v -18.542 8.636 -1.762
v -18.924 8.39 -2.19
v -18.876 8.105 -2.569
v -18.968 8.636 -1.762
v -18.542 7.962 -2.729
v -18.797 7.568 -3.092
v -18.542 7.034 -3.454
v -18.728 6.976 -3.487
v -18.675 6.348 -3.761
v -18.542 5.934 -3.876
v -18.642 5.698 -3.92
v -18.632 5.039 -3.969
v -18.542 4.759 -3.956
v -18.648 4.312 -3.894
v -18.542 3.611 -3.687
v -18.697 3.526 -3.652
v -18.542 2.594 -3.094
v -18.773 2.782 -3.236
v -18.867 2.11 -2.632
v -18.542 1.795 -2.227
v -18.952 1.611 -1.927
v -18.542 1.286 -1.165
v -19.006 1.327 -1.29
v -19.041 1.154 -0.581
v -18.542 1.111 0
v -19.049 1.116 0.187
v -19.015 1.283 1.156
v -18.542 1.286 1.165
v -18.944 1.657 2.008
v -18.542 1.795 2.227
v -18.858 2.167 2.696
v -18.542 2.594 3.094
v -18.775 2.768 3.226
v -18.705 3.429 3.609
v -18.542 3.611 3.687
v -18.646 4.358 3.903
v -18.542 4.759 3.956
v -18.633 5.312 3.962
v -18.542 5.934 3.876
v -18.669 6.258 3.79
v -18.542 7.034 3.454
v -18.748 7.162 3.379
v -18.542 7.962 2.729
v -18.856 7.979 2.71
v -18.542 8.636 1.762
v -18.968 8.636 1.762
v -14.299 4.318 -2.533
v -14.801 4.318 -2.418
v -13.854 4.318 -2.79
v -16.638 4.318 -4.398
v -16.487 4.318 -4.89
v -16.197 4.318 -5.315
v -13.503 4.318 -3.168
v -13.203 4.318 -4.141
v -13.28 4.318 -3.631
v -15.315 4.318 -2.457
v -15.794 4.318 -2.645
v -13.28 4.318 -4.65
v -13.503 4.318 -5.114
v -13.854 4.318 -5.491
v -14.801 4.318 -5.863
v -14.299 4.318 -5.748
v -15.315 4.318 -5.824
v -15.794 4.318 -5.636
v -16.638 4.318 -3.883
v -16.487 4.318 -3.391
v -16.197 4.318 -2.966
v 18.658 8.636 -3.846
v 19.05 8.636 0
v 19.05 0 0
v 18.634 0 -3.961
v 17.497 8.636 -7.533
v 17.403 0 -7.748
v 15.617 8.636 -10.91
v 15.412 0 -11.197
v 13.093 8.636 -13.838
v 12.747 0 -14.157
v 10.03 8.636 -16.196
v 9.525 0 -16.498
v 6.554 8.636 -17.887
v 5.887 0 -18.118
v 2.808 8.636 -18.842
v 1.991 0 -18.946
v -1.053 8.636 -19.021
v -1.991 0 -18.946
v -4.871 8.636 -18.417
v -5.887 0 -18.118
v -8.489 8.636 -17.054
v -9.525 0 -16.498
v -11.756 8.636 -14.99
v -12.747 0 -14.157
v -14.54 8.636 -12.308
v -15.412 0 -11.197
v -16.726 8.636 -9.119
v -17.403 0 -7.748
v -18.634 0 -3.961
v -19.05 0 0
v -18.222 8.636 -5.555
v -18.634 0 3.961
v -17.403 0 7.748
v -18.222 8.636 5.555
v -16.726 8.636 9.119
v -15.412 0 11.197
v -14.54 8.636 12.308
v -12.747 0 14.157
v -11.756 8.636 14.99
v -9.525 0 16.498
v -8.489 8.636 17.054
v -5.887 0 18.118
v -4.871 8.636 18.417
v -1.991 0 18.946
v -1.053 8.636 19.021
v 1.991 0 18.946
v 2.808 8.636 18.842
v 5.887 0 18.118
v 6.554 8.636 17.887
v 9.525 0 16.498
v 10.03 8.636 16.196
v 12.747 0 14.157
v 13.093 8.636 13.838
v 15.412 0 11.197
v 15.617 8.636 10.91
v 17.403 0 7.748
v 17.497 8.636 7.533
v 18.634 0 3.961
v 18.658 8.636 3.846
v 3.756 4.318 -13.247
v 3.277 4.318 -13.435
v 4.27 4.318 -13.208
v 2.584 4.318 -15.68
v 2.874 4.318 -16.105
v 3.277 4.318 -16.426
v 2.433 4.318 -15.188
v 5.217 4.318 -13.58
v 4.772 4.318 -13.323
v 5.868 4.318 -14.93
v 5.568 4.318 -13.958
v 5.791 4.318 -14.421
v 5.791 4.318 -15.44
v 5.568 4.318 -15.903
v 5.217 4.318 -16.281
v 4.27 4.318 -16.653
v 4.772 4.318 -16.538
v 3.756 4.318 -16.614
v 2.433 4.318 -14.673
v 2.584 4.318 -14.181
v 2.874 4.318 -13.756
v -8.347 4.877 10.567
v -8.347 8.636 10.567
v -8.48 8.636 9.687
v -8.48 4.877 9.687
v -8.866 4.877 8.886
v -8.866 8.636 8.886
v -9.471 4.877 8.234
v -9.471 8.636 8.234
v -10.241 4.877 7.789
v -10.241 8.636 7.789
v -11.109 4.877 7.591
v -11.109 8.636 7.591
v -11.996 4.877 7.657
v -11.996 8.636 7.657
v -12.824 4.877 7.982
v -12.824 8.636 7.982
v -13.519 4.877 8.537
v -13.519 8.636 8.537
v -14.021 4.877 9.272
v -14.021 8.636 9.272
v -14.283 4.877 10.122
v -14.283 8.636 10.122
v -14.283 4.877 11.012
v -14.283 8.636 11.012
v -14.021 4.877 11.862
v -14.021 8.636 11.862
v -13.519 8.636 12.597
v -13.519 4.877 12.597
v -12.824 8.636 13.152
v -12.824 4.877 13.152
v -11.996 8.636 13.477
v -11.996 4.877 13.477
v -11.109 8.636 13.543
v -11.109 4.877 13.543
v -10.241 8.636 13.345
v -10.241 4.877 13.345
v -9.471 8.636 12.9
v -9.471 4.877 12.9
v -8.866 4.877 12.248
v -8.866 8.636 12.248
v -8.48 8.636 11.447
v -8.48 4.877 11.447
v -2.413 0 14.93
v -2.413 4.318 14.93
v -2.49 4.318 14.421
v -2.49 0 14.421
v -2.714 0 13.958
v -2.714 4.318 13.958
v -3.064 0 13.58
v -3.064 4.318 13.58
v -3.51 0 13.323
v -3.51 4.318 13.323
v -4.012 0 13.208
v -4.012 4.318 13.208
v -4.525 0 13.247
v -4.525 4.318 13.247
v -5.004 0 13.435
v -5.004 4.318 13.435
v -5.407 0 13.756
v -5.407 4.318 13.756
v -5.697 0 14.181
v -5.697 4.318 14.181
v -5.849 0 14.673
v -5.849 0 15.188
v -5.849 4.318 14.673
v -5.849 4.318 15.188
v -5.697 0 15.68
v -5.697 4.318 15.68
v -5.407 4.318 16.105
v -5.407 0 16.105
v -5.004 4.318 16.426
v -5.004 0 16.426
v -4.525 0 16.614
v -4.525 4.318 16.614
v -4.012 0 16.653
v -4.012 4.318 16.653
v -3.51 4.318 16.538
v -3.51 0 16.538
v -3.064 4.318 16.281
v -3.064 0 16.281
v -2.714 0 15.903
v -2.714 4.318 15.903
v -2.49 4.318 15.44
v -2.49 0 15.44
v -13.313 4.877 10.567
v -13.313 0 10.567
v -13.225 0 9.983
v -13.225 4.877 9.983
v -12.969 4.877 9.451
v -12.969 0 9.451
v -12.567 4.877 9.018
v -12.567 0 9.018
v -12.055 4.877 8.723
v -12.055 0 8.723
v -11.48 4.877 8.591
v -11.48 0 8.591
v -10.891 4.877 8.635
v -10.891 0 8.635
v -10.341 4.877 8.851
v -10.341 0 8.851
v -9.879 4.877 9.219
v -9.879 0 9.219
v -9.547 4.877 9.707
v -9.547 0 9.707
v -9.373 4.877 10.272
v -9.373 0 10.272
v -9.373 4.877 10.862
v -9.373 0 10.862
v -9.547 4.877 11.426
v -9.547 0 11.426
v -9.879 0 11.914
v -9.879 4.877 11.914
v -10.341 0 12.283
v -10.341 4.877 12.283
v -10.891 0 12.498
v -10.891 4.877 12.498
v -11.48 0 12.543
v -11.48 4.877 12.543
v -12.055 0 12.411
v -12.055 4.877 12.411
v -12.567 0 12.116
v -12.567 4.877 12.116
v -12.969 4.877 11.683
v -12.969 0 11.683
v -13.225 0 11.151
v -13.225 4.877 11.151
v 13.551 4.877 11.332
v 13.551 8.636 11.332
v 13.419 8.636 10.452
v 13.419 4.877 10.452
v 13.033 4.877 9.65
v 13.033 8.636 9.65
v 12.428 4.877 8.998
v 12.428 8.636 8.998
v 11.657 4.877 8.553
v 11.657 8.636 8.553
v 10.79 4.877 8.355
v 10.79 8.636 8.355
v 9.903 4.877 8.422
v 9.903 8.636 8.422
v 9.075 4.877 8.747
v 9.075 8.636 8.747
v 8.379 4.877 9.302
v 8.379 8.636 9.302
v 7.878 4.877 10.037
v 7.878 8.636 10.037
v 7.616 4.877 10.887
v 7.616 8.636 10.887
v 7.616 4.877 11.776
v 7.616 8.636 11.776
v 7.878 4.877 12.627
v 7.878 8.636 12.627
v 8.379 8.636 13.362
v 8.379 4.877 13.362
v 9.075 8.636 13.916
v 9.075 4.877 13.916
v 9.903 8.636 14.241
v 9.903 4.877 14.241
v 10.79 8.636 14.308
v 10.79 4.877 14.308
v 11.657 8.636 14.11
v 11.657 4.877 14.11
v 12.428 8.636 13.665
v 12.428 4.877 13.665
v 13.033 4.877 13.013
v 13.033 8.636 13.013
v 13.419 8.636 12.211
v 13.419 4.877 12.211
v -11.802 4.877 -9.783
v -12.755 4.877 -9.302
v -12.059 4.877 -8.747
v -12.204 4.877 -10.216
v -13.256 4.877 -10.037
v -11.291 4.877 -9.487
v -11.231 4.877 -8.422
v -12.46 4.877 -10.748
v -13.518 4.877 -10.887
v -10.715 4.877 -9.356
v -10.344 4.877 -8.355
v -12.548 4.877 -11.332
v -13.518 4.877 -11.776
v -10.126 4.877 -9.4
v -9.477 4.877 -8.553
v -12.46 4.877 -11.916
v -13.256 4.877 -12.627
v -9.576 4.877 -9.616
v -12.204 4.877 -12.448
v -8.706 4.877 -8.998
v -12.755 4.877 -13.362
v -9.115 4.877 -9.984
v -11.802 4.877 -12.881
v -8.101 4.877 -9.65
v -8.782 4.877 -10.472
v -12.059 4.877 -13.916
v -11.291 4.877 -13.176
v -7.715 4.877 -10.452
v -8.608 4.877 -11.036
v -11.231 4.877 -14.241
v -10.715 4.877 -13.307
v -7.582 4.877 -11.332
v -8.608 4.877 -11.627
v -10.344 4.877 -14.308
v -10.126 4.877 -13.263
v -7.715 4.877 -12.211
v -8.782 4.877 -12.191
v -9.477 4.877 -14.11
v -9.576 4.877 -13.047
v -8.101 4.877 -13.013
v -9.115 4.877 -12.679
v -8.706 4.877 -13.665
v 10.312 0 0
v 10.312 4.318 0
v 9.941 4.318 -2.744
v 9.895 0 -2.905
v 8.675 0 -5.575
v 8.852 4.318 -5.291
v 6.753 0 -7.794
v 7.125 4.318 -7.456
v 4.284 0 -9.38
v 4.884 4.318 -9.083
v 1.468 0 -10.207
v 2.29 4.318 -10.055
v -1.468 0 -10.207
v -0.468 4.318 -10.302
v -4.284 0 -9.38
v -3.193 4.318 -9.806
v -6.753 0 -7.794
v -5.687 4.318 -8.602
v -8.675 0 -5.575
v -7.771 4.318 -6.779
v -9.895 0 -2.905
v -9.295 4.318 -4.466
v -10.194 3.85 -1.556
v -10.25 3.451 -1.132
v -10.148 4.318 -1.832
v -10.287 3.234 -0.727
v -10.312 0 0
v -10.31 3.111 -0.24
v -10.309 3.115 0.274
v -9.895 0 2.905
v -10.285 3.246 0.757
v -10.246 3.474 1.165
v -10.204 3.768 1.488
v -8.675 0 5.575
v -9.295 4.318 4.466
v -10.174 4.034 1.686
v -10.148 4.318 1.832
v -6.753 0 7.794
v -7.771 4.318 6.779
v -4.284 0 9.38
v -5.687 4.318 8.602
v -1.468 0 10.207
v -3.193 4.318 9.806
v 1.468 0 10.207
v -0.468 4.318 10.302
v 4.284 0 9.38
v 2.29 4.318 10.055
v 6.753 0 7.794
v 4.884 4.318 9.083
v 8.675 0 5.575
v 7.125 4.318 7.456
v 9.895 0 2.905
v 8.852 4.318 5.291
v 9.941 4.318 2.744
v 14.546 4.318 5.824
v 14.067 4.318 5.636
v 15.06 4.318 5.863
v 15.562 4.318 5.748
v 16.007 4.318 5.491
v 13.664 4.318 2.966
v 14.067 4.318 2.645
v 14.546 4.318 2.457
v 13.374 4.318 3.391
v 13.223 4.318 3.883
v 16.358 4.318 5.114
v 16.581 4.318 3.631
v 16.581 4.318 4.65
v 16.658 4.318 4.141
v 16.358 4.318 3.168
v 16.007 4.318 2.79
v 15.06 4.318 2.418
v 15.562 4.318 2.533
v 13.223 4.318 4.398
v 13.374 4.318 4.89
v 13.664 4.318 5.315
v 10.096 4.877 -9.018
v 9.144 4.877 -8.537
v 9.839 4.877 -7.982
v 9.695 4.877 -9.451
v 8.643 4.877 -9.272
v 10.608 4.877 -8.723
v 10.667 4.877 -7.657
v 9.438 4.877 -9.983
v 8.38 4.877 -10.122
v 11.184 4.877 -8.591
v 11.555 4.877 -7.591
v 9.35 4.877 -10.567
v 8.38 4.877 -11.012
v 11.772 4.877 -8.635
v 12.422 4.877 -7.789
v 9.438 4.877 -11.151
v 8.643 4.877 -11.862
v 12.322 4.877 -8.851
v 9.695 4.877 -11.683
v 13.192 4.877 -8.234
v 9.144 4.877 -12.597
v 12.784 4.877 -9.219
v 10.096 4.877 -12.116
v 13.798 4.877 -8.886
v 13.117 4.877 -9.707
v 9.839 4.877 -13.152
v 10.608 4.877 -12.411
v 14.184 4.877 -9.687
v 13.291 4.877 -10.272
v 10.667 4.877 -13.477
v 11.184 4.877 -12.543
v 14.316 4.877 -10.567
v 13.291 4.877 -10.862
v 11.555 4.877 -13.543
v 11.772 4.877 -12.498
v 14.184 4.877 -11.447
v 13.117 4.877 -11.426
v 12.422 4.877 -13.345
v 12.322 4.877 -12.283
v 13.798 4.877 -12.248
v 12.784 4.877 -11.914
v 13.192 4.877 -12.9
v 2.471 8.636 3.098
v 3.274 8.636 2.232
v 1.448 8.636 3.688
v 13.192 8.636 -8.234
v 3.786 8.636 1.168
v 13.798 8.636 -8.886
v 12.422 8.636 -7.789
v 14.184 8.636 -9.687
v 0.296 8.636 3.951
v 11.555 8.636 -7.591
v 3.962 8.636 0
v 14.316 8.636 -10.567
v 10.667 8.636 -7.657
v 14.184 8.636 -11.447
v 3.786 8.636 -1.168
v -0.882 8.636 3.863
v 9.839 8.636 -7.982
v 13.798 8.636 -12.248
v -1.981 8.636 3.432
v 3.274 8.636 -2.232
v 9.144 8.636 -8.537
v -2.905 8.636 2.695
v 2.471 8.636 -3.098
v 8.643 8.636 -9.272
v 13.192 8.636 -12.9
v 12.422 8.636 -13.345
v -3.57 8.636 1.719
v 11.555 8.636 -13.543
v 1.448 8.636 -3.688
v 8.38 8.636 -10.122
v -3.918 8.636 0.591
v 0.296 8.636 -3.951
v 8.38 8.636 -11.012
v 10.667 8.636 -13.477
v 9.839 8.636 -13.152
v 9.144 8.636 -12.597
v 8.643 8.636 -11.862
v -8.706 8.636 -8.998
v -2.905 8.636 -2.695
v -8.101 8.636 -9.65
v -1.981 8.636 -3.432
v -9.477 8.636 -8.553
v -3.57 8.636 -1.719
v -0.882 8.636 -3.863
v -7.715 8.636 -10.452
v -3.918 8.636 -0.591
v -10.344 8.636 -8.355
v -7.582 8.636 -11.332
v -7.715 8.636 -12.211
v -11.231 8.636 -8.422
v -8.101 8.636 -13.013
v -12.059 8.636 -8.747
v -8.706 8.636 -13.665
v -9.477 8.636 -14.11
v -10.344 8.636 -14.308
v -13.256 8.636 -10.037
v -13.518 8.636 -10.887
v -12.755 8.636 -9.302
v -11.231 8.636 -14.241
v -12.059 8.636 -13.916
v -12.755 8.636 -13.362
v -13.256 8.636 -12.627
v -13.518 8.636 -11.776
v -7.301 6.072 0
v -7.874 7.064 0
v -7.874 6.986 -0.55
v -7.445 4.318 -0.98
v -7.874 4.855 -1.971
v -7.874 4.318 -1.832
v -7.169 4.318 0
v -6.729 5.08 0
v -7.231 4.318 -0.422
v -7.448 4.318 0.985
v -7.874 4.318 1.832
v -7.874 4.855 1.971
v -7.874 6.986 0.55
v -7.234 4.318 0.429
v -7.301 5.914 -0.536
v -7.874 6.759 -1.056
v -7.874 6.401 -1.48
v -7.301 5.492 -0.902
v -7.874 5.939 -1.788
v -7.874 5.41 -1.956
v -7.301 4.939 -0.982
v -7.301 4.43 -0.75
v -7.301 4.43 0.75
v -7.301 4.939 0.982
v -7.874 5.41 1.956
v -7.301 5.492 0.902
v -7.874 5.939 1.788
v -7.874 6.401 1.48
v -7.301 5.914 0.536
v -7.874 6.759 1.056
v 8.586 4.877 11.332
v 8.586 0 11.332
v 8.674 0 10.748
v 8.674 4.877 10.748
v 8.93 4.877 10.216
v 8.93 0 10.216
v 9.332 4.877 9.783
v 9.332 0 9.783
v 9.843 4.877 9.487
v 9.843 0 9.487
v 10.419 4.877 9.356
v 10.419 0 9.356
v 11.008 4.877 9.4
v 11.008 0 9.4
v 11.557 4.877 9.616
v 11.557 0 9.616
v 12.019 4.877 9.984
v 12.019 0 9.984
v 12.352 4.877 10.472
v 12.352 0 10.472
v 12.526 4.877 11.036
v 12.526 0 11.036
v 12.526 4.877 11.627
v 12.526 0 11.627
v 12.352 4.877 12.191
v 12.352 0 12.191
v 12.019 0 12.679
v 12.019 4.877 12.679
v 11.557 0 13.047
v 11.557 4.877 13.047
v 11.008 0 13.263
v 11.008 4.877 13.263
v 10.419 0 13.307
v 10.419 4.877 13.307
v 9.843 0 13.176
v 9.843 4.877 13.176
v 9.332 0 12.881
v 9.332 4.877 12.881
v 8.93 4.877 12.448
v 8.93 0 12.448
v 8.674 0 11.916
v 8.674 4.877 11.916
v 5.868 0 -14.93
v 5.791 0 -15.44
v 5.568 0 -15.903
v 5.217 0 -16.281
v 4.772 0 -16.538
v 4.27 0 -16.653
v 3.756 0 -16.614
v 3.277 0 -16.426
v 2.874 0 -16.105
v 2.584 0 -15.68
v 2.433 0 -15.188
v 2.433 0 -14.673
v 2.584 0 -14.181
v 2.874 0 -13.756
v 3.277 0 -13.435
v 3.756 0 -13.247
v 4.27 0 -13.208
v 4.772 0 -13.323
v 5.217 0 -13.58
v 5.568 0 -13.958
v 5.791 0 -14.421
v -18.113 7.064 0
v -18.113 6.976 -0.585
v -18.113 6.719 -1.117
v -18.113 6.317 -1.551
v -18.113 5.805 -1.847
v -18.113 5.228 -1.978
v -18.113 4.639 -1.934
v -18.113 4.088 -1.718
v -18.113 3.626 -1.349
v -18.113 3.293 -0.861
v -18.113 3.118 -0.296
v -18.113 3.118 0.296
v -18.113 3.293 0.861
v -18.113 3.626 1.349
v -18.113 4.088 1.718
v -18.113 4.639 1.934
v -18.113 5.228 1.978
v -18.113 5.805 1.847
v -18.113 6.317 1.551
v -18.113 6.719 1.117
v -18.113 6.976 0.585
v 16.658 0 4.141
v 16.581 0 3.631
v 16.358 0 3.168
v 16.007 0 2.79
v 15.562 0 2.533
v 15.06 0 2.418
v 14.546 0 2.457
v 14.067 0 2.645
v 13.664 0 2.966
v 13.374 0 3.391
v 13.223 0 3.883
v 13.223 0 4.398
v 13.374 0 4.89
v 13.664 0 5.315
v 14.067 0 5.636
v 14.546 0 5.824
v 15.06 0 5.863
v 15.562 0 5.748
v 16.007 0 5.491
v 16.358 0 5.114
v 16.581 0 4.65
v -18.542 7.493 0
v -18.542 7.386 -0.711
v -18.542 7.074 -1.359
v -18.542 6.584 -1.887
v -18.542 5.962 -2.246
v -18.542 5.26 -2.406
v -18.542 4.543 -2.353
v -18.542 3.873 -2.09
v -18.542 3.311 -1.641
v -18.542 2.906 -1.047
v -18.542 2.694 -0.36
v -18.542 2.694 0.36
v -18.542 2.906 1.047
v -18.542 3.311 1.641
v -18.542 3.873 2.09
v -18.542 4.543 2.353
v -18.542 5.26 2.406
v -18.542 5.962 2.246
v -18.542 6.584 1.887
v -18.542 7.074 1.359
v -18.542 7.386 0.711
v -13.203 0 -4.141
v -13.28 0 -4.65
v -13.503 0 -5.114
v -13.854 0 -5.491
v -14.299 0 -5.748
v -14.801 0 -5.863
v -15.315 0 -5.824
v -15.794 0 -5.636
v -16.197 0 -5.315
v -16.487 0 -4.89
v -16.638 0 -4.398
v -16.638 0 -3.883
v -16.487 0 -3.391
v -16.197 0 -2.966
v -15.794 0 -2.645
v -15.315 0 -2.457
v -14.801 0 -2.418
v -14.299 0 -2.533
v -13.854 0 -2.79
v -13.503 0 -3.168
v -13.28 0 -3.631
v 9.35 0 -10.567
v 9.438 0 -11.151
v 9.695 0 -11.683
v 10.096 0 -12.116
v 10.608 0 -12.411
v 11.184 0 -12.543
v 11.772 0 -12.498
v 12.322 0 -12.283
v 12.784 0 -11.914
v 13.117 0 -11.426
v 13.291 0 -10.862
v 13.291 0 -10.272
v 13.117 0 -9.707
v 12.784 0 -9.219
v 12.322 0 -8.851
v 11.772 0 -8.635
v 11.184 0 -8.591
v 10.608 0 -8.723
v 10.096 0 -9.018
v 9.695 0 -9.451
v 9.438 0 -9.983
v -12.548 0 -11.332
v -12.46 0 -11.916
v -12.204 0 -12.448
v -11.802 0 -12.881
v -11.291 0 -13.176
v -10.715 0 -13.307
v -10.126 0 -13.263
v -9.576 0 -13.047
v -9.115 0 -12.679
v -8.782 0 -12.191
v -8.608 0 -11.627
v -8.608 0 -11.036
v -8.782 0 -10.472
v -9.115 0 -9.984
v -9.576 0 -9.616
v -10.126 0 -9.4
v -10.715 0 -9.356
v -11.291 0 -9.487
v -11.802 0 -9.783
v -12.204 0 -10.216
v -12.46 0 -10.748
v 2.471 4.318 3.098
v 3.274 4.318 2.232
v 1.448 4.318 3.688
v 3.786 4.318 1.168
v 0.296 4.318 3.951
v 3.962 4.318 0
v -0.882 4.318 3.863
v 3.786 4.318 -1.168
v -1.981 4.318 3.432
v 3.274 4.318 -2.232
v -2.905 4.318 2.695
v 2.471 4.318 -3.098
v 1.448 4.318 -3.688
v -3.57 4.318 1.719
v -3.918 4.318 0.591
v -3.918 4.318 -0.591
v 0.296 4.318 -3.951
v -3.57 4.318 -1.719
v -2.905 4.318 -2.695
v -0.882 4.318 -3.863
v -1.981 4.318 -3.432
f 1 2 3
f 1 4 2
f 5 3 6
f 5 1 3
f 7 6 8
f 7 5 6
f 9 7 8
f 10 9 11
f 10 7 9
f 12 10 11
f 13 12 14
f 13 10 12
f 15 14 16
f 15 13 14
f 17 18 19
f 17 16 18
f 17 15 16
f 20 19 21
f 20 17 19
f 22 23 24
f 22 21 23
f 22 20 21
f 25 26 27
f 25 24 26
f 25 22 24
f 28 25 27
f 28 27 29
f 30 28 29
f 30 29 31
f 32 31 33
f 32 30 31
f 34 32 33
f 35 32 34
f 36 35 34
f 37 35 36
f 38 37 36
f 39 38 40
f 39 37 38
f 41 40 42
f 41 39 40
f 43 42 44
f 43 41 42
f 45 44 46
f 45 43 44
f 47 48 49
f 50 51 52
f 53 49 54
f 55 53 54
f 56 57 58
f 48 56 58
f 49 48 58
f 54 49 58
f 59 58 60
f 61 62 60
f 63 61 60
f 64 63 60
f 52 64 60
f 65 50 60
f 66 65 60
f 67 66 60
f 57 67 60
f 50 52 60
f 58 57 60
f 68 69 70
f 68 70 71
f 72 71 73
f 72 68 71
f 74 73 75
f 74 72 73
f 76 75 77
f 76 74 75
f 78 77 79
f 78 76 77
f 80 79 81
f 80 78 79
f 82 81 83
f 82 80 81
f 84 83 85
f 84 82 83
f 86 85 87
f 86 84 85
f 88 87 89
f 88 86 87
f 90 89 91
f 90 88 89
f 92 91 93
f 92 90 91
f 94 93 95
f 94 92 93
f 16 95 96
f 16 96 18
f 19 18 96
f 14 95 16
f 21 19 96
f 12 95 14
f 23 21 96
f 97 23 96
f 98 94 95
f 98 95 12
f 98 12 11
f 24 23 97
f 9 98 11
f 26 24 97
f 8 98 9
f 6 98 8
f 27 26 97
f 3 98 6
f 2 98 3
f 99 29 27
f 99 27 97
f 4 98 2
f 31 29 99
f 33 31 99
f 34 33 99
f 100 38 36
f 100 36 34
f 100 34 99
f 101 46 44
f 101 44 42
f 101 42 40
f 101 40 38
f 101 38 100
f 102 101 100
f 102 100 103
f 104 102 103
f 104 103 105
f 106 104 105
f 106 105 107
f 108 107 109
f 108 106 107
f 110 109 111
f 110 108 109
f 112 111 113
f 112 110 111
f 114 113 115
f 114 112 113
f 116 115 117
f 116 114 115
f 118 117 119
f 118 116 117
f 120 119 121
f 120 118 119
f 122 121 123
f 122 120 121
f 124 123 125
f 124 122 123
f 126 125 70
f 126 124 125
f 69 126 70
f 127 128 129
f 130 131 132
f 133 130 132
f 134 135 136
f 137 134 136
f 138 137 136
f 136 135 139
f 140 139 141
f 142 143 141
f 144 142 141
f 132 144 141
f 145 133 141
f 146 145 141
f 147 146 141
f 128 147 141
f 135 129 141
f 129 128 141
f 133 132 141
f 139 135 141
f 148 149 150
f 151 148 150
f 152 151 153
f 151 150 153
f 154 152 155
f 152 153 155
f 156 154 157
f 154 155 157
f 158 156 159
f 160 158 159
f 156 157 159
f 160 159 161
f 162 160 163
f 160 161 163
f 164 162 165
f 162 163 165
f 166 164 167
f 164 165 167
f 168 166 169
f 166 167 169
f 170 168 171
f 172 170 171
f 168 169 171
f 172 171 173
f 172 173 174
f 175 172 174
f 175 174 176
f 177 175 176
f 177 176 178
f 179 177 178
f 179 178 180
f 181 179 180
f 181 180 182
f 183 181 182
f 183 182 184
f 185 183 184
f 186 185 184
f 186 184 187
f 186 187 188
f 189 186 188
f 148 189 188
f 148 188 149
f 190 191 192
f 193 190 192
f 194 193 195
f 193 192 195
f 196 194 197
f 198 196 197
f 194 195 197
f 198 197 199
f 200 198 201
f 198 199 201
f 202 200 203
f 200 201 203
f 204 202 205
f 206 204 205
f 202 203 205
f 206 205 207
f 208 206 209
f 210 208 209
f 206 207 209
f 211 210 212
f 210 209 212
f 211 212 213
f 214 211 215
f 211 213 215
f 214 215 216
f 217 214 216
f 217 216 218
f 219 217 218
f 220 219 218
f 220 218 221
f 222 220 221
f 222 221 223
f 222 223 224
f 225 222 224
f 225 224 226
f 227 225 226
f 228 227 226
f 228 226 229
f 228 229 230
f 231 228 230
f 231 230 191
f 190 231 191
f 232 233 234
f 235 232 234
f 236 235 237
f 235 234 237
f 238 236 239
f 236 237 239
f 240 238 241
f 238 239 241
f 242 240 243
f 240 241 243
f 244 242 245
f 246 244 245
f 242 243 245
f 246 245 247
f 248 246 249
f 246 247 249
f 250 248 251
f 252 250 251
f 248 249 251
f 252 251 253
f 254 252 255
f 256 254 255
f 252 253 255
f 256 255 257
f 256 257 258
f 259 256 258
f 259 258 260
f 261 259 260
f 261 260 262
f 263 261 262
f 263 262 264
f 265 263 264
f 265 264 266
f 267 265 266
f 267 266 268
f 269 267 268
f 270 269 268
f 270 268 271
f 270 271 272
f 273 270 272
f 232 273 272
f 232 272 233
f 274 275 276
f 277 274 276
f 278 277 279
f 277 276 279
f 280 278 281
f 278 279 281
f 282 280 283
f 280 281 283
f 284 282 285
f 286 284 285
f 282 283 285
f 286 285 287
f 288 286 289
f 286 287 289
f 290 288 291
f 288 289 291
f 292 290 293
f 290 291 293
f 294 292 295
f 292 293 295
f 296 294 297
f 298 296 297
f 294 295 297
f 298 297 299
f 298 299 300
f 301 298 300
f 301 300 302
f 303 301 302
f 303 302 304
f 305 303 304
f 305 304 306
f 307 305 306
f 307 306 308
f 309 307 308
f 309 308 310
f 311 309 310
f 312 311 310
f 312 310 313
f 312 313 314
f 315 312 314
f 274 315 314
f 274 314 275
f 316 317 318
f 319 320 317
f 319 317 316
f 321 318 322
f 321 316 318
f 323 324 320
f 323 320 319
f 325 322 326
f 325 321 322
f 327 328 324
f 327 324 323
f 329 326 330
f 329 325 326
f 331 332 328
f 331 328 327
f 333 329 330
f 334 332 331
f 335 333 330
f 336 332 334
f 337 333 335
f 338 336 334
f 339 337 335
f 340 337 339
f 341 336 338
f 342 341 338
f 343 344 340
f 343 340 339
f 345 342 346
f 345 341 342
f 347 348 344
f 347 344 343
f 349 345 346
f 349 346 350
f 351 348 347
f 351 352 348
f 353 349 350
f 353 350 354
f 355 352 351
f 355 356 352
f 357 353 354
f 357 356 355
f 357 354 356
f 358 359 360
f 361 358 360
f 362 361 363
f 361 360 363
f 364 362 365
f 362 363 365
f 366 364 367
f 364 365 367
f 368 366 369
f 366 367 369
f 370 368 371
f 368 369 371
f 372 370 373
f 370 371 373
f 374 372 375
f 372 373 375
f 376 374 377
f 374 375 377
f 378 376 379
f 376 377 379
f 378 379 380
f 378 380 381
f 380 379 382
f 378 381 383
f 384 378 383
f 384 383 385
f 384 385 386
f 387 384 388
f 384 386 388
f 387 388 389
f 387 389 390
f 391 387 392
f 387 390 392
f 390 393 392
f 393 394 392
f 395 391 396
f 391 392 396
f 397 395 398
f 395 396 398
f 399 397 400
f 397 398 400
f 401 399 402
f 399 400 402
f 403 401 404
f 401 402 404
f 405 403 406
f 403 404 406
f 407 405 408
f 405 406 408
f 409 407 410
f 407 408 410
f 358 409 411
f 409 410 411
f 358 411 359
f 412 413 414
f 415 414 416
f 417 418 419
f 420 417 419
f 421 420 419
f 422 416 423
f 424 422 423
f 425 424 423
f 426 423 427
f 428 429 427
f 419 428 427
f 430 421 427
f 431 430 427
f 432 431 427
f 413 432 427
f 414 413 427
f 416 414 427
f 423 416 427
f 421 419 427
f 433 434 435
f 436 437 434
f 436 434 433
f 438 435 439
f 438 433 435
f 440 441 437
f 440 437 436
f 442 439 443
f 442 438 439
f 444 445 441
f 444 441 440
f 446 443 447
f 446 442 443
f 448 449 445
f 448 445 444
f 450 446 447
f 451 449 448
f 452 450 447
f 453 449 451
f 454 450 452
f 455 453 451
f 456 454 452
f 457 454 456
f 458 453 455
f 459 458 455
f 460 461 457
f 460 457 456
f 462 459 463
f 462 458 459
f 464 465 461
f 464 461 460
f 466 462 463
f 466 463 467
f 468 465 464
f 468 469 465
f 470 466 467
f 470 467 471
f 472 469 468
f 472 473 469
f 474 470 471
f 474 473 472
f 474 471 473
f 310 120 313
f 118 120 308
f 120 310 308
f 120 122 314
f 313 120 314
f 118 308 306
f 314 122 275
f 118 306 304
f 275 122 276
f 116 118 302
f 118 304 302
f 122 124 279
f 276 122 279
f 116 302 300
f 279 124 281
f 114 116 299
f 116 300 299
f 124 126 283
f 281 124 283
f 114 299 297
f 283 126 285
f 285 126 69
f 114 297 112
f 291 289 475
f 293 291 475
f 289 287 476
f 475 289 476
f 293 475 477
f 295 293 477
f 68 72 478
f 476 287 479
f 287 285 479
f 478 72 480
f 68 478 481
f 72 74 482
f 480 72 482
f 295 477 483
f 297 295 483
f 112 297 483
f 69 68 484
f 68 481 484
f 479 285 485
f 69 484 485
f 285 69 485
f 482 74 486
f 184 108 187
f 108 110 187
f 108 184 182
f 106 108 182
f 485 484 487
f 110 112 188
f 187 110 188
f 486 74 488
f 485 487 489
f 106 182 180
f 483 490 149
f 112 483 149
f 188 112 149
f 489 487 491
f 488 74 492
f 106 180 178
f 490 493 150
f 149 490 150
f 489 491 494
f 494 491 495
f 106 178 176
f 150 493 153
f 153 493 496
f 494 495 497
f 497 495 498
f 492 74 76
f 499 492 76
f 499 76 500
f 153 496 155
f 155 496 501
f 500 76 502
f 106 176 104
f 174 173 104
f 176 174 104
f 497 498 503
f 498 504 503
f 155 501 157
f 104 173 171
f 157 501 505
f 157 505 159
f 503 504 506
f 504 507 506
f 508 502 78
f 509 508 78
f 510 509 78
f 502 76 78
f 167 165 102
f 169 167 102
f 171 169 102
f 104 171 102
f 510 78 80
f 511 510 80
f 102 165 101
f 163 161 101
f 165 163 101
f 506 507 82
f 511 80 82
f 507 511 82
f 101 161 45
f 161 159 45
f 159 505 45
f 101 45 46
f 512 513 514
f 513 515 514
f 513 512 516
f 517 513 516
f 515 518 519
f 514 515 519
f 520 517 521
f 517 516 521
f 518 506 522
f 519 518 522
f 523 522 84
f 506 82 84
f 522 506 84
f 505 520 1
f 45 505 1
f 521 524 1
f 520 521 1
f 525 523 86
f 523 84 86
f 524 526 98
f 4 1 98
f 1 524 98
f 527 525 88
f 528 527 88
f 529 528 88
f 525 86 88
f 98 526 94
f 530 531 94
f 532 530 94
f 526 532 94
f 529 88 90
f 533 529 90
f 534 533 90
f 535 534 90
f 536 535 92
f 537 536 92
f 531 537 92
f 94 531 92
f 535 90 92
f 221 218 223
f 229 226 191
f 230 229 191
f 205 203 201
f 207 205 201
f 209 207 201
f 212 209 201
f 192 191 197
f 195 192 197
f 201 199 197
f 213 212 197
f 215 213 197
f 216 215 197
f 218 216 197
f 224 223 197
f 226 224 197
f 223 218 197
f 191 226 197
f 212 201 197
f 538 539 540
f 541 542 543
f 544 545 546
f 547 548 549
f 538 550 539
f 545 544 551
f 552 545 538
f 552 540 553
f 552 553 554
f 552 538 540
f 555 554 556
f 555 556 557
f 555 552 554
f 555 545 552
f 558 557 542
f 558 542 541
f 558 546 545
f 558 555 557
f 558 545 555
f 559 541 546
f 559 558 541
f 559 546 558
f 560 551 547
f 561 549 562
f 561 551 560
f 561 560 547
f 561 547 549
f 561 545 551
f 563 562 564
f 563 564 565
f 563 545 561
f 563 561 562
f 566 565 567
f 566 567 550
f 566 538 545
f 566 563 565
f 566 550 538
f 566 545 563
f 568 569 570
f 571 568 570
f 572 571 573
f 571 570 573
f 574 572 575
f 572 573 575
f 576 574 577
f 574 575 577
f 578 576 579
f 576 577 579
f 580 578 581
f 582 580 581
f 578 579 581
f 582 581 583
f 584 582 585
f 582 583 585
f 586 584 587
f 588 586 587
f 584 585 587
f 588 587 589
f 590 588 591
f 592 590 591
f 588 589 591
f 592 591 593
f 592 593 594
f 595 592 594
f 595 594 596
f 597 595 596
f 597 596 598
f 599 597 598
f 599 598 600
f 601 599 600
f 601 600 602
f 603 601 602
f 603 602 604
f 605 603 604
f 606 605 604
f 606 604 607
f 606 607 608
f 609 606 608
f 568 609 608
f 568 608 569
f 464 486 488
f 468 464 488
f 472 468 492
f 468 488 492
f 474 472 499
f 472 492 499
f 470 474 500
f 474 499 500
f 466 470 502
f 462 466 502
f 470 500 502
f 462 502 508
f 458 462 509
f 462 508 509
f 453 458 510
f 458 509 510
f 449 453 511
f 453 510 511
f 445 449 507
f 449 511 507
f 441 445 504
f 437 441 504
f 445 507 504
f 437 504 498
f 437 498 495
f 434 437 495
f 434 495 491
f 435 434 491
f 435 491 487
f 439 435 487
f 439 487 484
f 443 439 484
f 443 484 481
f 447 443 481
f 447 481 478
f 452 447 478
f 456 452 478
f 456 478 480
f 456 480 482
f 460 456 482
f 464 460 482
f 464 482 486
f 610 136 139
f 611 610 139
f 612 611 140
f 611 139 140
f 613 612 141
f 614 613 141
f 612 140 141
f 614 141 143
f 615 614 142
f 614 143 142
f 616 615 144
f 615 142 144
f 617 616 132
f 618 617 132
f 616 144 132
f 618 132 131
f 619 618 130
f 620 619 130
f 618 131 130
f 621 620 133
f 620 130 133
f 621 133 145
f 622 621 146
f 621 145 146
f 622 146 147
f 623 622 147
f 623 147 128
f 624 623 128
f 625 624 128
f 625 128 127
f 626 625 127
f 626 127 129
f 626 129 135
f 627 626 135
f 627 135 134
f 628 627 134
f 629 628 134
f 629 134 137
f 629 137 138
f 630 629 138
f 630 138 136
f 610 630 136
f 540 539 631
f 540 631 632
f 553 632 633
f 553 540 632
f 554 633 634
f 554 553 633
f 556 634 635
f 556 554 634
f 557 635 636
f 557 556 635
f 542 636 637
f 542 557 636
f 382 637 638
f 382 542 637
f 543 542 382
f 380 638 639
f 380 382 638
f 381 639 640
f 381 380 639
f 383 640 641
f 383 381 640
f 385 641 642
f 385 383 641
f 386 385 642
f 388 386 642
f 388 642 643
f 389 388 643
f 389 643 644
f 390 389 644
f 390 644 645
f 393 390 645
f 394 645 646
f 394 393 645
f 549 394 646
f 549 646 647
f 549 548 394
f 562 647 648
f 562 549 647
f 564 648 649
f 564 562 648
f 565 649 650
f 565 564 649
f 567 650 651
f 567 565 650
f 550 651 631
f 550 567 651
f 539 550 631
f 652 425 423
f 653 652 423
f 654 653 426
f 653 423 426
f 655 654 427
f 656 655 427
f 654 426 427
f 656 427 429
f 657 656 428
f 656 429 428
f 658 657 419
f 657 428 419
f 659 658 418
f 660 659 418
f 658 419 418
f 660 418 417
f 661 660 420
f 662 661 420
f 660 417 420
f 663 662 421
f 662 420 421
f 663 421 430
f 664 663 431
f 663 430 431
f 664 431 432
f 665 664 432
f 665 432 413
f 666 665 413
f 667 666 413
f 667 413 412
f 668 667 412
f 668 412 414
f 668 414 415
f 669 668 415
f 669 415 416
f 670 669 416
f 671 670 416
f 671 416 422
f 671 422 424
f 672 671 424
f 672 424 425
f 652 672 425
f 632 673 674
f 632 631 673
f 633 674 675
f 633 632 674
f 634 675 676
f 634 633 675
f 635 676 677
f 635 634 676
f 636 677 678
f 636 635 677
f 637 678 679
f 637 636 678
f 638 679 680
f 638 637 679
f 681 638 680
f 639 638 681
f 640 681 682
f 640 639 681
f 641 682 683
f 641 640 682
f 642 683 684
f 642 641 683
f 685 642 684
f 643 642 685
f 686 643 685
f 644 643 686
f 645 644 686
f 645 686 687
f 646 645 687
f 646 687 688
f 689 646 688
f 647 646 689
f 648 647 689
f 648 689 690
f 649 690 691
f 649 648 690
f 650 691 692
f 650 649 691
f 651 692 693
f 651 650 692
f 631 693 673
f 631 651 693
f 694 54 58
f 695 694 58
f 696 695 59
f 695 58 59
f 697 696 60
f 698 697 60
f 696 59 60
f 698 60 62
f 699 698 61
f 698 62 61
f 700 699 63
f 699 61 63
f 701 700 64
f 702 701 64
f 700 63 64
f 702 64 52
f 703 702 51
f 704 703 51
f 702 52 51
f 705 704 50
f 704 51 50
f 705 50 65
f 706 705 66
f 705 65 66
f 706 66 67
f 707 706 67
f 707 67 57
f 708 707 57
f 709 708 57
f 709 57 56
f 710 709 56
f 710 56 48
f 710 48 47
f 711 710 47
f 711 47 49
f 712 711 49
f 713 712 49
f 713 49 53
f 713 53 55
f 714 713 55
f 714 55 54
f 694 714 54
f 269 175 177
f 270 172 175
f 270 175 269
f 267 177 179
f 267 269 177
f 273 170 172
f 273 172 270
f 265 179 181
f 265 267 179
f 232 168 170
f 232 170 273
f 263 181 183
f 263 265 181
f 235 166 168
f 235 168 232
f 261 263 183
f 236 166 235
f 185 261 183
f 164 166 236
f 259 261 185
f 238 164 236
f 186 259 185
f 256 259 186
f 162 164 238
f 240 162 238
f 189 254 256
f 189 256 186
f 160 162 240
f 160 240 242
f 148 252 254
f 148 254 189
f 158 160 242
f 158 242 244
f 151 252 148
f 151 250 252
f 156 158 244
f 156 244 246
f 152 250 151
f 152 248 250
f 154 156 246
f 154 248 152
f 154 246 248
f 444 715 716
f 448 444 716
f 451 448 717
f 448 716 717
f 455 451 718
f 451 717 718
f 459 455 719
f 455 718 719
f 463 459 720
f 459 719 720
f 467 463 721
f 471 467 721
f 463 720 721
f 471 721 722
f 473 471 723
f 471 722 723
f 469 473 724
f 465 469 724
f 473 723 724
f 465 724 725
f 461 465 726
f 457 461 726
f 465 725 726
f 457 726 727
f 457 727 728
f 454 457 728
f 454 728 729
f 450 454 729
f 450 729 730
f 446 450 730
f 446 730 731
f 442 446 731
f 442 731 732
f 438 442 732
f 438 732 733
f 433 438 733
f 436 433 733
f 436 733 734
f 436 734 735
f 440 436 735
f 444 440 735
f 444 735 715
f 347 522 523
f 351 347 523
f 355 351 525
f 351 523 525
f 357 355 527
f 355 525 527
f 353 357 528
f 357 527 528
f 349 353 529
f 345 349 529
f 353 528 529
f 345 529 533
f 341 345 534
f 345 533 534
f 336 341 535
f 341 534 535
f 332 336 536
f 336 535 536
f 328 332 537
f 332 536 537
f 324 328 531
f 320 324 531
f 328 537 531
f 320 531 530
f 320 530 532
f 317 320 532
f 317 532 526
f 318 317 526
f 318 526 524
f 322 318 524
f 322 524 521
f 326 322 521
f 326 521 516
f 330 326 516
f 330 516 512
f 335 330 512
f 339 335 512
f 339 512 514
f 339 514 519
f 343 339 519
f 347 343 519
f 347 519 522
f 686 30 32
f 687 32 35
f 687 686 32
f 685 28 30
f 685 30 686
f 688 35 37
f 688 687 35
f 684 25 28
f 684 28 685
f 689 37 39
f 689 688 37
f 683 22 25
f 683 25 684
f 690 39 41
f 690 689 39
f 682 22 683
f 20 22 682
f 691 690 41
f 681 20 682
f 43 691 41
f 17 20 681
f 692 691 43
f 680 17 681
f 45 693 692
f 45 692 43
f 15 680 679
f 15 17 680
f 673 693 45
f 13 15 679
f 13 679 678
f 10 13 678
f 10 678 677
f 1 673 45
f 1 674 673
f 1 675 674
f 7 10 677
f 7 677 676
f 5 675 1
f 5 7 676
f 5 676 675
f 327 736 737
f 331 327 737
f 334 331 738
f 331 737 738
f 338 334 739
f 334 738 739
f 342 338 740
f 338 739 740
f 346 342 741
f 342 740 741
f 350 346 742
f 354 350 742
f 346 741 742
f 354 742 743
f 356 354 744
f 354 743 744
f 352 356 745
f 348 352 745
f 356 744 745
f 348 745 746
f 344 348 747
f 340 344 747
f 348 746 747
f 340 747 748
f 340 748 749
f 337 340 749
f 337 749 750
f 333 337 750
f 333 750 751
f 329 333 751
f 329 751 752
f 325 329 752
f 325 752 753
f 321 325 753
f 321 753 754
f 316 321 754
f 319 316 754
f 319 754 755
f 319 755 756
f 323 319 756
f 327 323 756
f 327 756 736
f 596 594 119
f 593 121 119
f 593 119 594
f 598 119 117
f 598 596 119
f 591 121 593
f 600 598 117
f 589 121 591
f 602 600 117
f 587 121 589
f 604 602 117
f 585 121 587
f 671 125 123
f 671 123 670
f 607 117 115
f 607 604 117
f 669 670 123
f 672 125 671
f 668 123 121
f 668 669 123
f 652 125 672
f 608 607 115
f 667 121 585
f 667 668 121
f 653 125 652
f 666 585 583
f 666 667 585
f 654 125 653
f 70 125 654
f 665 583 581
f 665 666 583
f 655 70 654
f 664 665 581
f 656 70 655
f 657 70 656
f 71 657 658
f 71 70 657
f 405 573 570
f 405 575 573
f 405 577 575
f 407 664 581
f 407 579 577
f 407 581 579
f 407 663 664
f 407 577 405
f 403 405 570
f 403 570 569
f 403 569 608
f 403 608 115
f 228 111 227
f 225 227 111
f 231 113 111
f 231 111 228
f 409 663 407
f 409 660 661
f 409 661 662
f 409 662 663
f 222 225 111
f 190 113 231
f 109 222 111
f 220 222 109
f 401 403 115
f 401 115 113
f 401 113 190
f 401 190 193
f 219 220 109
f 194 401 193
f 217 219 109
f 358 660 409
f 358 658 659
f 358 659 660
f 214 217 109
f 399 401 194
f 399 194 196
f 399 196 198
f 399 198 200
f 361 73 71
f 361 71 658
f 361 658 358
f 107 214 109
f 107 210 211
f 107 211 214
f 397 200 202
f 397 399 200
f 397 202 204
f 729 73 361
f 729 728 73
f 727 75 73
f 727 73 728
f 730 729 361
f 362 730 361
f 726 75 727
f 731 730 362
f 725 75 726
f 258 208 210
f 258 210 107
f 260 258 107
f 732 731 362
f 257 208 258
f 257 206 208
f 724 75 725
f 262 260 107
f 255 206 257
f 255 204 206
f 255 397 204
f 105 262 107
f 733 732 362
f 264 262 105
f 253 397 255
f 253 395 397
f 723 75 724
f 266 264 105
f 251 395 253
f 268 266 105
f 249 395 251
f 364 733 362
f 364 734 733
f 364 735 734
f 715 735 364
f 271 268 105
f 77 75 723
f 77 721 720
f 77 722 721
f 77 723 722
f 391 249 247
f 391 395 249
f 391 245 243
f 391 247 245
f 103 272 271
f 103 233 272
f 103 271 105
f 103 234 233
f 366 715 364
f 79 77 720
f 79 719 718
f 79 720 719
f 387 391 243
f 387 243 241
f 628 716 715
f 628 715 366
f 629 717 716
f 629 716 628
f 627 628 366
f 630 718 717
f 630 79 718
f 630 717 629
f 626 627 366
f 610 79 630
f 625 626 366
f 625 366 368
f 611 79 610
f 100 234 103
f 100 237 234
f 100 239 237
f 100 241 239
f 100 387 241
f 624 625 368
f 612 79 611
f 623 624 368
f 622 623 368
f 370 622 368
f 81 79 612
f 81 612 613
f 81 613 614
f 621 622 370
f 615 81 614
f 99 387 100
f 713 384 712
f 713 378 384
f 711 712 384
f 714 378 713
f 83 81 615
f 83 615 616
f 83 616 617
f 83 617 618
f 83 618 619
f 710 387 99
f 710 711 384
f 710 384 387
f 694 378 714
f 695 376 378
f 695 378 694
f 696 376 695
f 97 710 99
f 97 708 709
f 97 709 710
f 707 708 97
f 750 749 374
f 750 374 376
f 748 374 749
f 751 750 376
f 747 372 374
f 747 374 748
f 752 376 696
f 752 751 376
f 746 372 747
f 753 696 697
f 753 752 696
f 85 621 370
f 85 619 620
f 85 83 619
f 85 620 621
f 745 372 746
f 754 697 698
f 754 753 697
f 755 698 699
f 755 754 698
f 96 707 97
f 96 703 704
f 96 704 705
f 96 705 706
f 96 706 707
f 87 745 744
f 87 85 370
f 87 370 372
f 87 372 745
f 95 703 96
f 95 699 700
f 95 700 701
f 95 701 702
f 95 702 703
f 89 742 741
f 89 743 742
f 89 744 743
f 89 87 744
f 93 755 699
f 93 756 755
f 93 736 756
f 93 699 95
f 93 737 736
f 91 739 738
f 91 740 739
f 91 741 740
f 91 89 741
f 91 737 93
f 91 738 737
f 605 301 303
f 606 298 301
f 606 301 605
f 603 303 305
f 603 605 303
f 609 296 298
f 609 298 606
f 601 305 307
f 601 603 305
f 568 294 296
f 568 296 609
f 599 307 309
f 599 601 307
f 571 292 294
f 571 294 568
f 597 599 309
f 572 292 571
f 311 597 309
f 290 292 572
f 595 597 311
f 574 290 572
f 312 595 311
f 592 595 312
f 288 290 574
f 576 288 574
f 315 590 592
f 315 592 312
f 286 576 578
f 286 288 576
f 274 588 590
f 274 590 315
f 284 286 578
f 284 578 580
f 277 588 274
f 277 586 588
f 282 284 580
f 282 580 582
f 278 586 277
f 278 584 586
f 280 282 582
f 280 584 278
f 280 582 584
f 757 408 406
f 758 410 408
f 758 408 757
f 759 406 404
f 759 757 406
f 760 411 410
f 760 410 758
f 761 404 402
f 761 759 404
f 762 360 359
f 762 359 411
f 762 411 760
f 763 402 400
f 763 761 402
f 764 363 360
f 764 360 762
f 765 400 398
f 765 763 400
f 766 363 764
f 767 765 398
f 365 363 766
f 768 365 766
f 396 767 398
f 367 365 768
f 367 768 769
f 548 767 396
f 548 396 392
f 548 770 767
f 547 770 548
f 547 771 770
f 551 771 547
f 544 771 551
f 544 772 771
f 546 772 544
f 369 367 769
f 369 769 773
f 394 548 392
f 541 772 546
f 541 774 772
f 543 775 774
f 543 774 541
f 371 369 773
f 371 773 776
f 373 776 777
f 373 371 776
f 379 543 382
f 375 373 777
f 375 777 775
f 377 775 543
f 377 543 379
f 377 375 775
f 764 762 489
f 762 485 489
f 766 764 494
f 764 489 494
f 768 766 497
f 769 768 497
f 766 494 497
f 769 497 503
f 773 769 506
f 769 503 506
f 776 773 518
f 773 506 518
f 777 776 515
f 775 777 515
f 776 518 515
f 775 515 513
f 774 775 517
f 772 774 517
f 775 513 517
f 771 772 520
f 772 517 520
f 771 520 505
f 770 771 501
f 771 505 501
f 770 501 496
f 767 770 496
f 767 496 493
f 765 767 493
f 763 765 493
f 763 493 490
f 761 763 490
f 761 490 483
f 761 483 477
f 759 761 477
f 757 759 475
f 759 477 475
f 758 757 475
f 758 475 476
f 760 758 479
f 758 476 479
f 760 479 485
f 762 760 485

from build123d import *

# Parameters (mm, degrees)
SKETCH1_W         = 19.05
SKETCH1_H         = 8.636
HOLE1_D           = 3.9624
HOLE1_CBORE_D     = 5.969
HOLE1_CBORE_DEPTH = 3.7592
HOLE2_D           = 3.9624
HOLE2_CBORE_D     = 5.969
HOLE2_CBORE_DEPTH = 3.7592
HOLE3_D           = 3.9624
HOLE3_CBORE_D     = 5.969
HOLE3_CBORE_DEPTH = 3.7592
HOLE4_D           = 3.9624
HOLE4_CBORE_D     = 5.969
HOLE4_CBORE_DEPTH = 3.7592
HOLE5_D           = 7.9248
SKETCH13_W        = 10.3124
SKETCH13_H        = 4.318
HOLE6_D           = 3.4544
HOLE6_DEPTH       = 4.318
HOLE7_D           = 3.4544
HOLE7_DEPTH       = 4.318
HOLE8_D           = 3.4544
HOLE8_DEPTH       = 4.318
HOLE9_D           = 3.4544
HOLE9_DEPTH       = 4.318


with BuildPart() as part:
    # Sketch1 → Revolve1 (revolve)
    with BuildSketch(Plane.XY):
        with Locations((9.525, 4.318)):
            Rectangle(SKETCH1_W, SKETCH1_H)
    revolve(axis=Axis((0, 0, 0), (0, 1, 0)))

    # Sketch2 → Cut-Revolve1 (revolve, cut)
    with BuildSketch(Plane.XY):
        Polygon((-19.05, 5.08), (-19.05, 9.04875), (-18.542, 9.04875), (-18.542, 7.493), (-18.11274, 7.06374), (-7.874, 7.06374), (-6.728687177, 5.08), align=None)
    revolve(axis=Axis((-6.728687177, 5.08, 0), (-1, 0, 0)), mode=Mode.SUBTRACT)

    # Hole1 (through all)
    with Locations(Plane(origin=(0, 8.636, 0), x_dir=(1, 0, 0), z_dir=(0, 1, 0))):
        with Locations((-10.566882591, 11.331594253)):
            CounterBoreHole(HOLE1_D / 2, HOLE1_CBORE_D / 2, HOLE1_CBORE_DEPTH)

    # Hole2 (through all)
    with Locations(Plane(origin=(0, 8.636, 0), x_dir=(1, 0, 0), z_dir=(0, 1, 0))):
        with Locations((-11.331594253, -10.566882591)):
            CounterBoreHole(HOLE2_D / 2, HOLE2_CBORE_D / 2, HOLE2_CBORE_DEPTH)

    # Hole3 (through all)
    with Locations(Plane(origin=(0, 8.636, 0), x_dir=(1, 0, 0), z_dir=(0, 1, 0))):
        with Locations((10.566882591, -11.331594253)):
            CounterBoreHole(HOLE3_D / 2, HOLE3_CBORE_D / 2, HOLE3_CBORE_DEPTH)

    # Hole4 (through all)
    with Locations(Plane(origin=(0, 8.636, 0), x_dir=(1, 0, 0), z_dir=(0, 1, 0))):
        with Locations((11.331594253, 10.566882591)):
            CounterBoreHole(HOLE4_D / 2, HOLE4_CBORE_D / 2, HOLE4_CBORE_DEPTH)

    # Hole5 (through all)
    with Locations(Plane(origin=(0, 0, 0), x_dir=(-1, 0, 0), z_dir=(0, -1, 0))):
        with Locations((0, 0)):
            Hole(HOLE5_D / 2)

    # Sketch13 → Cut-Revolve2 (revolve, cut)
    with BuildSketch(Plane.XY):
        with Locations((5.1562, 2.159)):
            Rectangle(SKETCH13_W, SKETCH13_H)
    revolve(axis=Axis((0, 0, 0), (0, 1, 0)), mode=Mode.SUBTRACT)

    # Hole6
    with Locations(Plane(origin=(0, 0, 0), x_dir=(-1, 0, 0), z_dir=(0, -1, 0))):
        with Locations((4.140591399, -14.930490242)):
            Hole(HOLE6_D / 2, depth=HOLE6_DEPTH)

    # Hole7
    with Locations(Plane(origin=(0, 0, 0), x_dir=(-1, 0, 0), z_dir=(0, -1, 0))):
        with Locations((-14.930490242, -4.140591399)):
            Hole(HOLE7_D / 2, depth=HOLE7_DEPTH)

    # Hole8
    with Locations(Plane(origin=(0, 0, 0), x_dir=(-1, 0, 0), z_dir=(0, -1, 0))):
        with Locations((-4.140591399, 14.930490242)):
            Hole(HOLE8_D / 2, depth=HOLE8_DEPTH)

    # Hole9
    with Locations(Plane(origin=(0, 0, 0), x_dir=(-1, 0, 0), z_dir=(0, -1, 0))):
        with Locations((14.930490242, 4.140591399)):
            Hole(HOLE9_D / 2, depth=HOLE9_DEPTH)


solid = part.part
